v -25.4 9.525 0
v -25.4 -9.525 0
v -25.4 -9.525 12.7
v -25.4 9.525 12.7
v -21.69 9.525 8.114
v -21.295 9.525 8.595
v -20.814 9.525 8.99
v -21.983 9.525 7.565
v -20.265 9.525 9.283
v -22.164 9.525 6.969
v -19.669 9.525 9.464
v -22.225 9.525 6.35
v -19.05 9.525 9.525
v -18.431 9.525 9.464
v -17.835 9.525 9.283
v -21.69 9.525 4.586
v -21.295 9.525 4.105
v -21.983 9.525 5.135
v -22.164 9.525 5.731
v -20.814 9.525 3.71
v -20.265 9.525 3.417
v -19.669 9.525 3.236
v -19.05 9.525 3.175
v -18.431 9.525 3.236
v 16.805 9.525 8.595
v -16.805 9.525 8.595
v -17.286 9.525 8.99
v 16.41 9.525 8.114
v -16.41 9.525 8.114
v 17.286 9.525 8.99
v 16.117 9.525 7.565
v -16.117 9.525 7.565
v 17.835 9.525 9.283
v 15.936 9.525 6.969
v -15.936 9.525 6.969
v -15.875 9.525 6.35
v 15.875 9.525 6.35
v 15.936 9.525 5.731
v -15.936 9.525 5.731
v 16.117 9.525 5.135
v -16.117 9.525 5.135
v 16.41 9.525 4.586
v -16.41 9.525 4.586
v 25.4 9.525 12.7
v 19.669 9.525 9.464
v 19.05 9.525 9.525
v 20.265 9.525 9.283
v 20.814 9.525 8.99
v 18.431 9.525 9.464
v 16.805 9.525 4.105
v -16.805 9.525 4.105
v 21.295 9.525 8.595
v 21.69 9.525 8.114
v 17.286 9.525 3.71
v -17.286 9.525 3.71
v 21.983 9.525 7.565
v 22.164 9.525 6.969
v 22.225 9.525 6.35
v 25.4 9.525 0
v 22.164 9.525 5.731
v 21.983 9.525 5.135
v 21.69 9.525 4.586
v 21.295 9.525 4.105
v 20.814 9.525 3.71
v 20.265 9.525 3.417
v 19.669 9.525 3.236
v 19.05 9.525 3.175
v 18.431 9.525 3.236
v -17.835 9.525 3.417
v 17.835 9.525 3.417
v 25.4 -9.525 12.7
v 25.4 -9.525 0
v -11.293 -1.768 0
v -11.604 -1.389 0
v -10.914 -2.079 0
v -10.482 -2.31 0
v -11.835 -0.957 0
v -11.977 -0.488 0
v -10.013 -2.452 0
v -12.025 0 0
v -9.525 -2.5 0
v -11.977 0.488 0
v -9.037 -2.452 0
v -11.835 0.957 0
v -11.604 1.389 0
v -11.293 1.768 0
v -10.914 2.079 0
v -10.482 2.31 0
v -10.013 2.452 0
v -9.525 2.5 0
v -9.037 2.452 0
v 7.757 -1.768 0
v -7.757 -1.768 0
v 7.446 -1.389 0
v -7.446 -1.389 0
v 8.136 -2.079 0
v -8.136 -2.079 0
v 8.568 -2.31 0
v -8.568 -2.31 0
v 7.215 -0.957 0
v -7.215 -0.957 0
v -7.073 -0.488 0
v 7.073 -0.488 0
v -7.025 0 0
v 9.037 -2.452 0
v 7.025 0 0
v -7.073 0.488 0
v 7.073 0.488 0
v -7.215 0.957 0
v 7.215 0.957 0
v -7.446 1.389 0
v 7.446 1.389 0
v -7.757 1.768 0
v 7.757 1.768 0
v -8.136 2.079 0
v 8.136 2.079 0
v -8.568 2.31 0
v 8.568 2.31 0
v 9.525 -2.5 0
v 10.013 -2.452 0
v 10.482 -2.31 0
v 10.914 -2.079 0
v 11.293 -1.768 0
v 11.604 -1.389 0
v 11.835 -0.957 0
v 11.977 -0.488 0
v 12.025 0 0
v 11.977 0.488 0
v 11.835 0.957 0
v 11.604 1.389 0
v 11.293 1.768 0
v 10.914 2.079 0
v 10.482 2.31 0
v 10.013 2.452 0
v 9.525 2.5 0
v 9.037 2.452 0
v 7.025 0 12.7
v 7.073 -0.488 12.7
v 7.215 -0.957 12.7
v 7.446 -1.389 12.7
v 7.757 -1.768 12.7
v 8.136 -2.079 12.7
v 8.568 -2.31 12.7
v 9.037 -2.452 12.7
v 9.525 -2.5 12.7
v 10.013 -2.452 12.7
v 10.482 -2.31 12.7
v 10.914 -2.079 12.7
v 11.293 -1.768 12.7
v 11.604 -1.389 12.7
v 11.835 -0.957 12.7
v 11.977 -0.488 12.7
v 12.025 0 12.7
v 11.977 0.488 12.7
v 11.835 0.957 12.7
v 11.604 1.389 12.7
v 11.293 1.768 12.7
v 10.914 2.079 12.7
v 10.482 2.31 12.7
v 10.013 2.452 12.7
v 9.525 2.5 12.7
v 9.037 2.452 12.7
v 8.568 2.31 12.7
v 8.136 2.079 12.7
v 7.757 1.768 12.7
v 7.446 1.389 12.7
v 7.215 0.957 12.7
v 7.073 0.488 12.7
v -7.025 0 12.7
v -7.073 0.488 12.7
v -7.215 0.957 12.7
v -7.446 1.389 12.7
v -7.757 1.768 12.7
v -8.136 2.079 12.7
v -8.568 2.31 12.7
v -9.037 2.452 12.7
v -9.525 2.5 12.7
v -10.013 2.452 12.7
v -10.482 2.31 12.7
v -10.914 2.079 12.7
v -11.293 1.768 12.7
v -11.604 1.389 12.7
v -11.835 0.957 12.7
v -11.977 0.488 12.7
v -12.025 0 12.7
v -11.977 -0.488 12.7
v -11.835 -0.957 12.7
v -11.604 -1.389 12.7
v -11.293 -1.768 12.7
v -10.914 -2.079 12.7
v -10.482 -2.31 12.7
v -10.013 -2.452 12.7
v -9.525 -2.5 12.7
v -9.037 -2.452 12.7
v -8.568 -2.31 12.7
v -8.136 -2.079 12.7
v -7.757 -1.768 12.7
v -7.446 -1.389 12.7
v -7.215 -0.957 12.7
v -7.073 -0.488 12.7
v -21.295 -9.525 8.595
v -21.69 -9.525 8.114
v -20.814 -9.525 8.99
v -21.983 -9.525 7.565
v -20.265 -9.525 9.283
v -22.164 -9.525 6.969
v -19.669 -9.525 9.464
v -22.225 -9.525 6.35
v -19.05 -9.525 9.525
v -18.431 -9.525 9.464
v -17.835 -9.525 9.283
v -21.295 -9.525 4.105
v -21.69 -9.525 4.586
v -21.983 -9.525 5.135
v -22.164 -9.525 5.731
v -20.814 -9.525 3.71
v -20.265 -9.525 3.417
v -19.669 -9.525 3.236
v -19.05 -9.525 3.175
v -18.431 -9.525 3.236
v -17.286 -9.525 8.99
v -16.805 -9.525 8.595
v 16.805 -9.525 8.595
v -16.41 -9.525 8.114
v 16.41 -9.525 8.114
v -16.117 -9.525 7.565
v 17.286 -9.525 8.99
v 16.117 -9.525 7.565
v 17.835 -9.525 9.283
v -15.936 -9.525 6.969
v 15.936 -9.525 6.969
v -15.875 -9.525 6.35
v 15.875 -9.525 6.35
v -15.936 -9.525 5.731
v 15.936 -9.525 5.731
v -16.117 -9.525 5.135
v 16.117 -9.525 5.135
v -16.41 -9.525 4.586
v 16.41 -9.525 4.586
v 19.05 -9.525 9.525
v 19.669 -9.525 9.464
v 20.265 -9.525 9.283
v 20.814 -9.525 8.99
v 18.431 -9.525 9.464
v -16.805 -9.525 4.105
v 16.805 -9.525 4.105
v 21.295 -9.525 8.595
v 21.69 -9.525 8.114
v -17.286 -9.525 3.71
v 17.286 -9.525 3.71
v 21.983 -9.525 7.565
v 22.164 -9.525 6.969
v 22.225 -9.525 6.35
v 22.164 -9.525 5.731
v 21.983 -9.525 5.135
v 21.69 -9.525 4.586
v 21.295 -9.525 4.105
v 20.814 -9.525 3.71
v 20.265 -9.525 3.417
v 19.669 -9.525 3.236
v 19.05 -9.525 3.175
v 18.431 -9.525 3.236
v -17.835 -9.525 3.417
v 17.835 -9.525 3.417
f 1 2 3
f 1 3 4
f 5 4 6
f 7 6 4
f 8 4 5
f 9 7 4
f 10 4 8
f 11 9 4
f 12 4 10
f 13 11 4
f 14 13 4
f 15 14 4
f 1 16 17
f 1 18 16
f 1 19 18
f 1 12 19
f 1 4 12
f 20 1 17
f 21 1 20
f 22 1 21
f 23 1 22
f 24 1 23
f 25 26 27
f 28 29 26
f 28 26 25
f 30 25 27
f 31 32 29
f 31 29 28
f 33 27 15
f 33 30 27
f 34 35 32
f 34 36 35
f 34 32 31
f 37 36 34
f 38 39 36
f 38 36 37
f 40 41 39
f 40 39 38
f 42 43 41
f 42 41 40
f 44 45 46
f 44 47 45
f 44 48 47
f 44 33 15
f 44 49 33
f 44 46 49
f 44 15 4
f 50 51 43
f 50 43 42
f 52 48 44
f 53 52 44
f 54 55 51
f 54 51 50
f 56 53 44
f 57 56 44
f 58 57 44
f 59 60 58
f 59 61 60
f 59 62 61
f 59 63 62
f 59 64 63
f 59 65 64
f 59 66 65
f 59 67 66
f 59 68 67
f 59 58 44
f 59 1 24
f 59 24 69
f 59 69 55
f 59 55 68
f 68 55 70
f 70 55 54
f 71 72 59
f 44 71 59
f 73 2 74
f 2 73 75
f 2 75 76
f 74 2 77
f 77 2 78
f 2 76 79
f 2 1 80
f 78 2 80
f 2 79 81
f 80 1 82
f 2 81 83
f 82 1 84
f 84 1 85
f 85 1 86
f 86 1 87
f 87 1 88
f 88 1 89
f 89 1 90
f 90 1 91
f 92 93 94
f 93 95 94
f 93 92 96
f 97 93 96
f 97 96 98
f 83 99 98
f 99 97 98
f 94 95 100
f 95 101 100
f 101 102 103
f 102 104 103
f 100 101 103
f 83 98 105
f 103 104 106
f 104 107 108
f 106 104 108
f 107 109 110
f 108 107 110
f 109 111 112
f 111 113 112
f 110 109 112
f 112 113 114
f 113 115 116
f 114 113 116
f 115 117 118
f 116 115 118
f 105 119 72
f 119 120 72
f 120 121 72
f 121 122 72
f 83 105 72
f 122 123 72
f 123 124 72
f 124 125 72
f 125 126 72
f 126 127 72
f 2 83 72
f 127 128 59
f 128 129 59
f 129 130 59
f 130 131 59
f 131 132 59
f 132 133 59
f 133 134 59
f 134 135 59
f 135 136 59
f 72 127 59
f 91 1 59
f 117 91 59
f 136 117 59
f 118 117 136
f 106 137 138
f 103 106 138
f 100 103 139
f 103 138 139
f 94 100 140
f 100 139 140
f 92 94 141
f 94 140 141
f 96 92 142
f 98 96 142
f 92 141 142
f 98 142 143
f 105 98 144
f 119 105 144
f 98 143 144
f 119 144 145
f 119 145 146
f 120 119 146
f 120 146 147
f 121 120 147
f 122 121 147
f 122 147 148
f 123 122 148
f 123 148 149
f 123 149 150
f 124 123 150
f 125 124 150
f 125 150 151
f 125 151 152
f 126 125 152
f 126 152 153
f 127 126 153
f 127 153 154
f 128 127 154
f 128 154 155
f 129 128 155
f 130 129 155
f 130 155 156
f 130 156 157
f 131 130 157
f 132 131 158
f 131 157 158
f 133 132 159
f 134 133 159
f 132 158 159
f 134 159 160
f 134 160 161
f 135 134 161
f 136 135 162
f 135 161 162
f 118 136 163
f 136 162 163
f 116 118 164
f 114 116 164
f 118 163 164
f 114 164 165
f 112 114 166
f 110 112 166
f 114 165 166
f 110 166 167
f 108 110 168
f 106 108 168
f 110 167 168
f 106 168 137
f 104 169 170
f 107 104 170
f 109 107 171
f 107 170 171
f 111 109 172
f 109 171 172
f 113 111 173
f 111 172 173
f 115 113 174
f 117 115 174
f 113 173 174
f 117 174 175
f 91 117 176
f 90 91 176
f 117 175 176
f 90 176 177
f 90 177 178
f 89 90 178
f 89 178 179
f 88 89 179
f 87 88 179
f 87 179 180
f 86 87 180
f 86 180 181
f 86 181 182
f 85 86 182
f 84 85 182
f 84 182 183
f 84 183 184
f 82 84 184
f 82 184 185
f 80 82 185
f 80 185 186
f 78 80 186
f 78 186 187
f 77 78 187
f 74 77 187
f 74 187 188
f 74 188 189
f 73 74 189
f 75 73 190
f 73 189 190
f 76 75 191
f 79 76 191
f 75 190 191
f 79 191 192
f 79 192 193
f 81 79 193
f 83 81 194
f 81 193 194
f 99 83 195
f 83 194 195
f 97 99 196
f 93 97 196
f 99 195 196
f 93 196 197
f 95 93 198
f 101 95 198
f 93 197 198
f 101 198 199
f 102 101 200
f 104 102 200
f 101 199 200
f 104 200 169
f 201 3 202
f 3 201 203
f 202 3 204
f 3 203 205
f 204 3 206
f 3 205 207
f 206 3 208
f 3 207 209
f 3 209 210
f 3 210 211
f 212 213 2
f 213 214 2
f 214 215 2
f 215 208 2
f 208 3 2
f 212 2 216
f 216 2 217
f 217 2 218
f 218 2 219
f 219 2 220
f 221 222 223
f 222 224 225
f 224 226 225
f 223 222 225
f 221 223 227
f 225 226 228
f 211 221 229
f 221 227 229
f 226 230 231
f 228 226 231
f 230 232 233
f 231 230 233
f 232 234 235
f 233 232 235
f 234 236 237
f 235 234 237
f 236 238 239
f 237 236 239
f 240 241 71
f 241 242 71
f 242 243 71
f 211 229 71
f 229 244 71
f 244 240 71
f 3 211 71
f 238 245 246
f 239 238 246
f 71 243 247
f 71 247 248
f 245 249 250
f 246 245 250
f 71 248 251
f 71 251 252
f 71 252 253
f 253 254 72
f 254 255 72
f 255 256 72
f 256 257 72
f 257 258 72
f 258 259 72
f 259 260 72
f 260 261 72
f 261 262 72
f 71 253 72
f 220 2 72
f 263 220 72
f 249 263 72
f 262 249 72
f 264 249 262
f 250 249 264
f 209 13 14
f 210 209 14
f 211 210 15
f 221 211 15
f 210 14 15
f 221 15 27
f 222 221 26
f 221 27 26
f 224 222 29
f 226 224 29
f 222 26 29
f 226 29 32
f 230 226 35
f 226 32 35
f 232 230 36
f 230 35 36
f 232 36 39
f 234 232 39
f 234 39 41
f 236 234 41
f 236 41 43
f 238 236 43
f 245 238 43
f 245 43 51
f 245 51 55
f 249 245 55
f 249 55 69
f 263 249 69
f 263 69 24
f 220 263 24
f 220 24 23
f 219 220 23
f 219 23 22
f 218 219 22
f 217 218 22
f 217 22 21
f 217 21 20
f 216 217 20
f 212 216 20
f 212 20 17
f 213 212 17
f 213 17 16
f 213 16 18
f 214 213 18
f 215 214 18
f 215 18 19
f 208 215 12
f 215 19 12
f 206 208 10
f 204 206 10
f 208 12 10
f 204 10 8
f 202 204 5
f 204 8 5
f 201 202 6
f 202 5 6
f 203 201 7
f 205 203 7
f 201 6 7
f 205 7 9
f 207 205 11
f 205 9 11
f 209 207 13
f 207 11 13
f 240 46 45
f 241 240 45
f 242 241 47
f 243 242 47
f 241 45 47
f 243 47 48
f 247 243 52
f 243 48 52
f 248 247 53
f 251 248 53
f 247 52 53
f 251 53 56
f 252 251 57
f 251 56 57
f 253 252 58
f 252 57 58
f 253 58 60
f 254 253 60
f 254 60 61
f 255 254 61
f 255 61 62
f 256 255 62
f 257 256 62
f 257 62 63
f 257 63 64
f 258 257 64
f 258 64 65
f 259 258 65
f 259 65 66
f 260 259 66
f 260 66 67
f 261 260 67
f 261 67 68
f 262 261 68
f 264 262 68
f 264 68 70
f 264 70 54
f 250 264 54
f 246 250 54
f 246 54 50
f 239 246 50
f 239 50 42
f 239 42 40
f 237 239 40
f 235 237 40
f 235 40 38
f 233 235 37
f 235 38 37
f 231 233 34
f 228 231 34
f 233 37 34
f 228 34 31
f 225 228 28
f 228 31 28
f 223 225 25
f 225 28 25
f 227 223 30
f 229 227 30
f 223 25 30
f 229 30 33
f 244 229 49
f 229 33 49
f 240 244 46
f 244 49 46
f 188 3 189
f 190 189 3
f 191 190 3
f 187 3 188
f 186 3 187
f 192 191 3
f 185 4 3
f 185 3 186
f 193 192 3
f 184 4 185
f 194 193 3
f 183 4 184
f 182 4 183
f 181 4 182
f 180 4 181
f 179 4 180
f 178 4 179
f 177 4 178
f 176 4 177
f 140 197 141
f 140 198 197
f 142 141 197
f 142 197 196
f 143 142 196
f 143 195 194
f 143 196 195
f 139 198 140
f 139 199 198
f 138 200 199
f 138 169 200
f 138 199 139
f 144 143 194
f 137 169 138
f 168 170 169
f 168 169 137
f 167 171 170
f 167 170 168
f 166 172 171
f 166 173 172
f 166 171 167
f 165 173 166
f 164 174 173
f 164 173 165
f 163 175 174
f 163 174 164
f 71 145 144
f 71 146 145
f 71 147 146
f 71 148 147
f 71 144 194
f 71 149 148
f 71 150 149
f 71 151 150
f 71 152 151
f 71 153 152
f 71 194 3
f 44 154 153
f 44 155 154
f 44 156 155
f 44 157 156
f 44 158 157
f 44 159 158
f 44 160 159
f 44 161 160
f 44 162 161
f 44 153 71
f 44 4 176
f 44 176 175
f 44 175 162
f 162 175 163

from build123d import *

# Parameters (mm, degrees)
SKETCH1_W           = 50.8
SKETCH1_H           = 19.05
BOSS_EXTRUDE1_DEPTH = 12.7
SKETCH2_R           = 2.5
CUT_EXTRUDE1_DEPTH  = 30.952890094
SKETCH3_R           = 3.175
CUT_EXTRUDE2_DEPTH  = 35.195796525


with BuildPart() as part:
    # Sketch1 → Boss-Extrude1 (new body)
    with BuildSketch(Plane.XY):
        Rectangle(SKETCH1_W, SKETCH1_H)
    extrude(amount=BOSS_EXTRUDE1_DEPTH)

    # Sketch2 → Cut-Extrude1 (cut, through all)
    with BuildSketch(Plane.XY.offset(12.7)):
        with Locations((-9.525, 0)):
            Circle(SKETCH2_R)
        with Locations(Location((9.525, 0, 0), (0, 0, 180))):
            Circle(SKETCH2_R)
    extrude(amount=-CUT_EXTRUDE1_DEPTH, mode=Mode.SUBTRACT)

    # Sketch3 → Cut-Extrude2 (cut, through all)
    with BuildSketch(Plane(origin=(0, 9.525, 0), x_dir=(1, 0, 0), z_dir=(0, 1, 0))):
        with Locations(Location((-19.05, -6.35, 0), (0, 0, 270))):
            Circle(SKETCH3_R)
        with Locations(Location((19.05, -6.35, 0), (0, 0, 270))):
            Circle(SKETCH3_R)
    extrude(amount=-CUT_EXTRUDE2_DEPTH, mode=Mode.SUBTRACT)


solid = part.part
